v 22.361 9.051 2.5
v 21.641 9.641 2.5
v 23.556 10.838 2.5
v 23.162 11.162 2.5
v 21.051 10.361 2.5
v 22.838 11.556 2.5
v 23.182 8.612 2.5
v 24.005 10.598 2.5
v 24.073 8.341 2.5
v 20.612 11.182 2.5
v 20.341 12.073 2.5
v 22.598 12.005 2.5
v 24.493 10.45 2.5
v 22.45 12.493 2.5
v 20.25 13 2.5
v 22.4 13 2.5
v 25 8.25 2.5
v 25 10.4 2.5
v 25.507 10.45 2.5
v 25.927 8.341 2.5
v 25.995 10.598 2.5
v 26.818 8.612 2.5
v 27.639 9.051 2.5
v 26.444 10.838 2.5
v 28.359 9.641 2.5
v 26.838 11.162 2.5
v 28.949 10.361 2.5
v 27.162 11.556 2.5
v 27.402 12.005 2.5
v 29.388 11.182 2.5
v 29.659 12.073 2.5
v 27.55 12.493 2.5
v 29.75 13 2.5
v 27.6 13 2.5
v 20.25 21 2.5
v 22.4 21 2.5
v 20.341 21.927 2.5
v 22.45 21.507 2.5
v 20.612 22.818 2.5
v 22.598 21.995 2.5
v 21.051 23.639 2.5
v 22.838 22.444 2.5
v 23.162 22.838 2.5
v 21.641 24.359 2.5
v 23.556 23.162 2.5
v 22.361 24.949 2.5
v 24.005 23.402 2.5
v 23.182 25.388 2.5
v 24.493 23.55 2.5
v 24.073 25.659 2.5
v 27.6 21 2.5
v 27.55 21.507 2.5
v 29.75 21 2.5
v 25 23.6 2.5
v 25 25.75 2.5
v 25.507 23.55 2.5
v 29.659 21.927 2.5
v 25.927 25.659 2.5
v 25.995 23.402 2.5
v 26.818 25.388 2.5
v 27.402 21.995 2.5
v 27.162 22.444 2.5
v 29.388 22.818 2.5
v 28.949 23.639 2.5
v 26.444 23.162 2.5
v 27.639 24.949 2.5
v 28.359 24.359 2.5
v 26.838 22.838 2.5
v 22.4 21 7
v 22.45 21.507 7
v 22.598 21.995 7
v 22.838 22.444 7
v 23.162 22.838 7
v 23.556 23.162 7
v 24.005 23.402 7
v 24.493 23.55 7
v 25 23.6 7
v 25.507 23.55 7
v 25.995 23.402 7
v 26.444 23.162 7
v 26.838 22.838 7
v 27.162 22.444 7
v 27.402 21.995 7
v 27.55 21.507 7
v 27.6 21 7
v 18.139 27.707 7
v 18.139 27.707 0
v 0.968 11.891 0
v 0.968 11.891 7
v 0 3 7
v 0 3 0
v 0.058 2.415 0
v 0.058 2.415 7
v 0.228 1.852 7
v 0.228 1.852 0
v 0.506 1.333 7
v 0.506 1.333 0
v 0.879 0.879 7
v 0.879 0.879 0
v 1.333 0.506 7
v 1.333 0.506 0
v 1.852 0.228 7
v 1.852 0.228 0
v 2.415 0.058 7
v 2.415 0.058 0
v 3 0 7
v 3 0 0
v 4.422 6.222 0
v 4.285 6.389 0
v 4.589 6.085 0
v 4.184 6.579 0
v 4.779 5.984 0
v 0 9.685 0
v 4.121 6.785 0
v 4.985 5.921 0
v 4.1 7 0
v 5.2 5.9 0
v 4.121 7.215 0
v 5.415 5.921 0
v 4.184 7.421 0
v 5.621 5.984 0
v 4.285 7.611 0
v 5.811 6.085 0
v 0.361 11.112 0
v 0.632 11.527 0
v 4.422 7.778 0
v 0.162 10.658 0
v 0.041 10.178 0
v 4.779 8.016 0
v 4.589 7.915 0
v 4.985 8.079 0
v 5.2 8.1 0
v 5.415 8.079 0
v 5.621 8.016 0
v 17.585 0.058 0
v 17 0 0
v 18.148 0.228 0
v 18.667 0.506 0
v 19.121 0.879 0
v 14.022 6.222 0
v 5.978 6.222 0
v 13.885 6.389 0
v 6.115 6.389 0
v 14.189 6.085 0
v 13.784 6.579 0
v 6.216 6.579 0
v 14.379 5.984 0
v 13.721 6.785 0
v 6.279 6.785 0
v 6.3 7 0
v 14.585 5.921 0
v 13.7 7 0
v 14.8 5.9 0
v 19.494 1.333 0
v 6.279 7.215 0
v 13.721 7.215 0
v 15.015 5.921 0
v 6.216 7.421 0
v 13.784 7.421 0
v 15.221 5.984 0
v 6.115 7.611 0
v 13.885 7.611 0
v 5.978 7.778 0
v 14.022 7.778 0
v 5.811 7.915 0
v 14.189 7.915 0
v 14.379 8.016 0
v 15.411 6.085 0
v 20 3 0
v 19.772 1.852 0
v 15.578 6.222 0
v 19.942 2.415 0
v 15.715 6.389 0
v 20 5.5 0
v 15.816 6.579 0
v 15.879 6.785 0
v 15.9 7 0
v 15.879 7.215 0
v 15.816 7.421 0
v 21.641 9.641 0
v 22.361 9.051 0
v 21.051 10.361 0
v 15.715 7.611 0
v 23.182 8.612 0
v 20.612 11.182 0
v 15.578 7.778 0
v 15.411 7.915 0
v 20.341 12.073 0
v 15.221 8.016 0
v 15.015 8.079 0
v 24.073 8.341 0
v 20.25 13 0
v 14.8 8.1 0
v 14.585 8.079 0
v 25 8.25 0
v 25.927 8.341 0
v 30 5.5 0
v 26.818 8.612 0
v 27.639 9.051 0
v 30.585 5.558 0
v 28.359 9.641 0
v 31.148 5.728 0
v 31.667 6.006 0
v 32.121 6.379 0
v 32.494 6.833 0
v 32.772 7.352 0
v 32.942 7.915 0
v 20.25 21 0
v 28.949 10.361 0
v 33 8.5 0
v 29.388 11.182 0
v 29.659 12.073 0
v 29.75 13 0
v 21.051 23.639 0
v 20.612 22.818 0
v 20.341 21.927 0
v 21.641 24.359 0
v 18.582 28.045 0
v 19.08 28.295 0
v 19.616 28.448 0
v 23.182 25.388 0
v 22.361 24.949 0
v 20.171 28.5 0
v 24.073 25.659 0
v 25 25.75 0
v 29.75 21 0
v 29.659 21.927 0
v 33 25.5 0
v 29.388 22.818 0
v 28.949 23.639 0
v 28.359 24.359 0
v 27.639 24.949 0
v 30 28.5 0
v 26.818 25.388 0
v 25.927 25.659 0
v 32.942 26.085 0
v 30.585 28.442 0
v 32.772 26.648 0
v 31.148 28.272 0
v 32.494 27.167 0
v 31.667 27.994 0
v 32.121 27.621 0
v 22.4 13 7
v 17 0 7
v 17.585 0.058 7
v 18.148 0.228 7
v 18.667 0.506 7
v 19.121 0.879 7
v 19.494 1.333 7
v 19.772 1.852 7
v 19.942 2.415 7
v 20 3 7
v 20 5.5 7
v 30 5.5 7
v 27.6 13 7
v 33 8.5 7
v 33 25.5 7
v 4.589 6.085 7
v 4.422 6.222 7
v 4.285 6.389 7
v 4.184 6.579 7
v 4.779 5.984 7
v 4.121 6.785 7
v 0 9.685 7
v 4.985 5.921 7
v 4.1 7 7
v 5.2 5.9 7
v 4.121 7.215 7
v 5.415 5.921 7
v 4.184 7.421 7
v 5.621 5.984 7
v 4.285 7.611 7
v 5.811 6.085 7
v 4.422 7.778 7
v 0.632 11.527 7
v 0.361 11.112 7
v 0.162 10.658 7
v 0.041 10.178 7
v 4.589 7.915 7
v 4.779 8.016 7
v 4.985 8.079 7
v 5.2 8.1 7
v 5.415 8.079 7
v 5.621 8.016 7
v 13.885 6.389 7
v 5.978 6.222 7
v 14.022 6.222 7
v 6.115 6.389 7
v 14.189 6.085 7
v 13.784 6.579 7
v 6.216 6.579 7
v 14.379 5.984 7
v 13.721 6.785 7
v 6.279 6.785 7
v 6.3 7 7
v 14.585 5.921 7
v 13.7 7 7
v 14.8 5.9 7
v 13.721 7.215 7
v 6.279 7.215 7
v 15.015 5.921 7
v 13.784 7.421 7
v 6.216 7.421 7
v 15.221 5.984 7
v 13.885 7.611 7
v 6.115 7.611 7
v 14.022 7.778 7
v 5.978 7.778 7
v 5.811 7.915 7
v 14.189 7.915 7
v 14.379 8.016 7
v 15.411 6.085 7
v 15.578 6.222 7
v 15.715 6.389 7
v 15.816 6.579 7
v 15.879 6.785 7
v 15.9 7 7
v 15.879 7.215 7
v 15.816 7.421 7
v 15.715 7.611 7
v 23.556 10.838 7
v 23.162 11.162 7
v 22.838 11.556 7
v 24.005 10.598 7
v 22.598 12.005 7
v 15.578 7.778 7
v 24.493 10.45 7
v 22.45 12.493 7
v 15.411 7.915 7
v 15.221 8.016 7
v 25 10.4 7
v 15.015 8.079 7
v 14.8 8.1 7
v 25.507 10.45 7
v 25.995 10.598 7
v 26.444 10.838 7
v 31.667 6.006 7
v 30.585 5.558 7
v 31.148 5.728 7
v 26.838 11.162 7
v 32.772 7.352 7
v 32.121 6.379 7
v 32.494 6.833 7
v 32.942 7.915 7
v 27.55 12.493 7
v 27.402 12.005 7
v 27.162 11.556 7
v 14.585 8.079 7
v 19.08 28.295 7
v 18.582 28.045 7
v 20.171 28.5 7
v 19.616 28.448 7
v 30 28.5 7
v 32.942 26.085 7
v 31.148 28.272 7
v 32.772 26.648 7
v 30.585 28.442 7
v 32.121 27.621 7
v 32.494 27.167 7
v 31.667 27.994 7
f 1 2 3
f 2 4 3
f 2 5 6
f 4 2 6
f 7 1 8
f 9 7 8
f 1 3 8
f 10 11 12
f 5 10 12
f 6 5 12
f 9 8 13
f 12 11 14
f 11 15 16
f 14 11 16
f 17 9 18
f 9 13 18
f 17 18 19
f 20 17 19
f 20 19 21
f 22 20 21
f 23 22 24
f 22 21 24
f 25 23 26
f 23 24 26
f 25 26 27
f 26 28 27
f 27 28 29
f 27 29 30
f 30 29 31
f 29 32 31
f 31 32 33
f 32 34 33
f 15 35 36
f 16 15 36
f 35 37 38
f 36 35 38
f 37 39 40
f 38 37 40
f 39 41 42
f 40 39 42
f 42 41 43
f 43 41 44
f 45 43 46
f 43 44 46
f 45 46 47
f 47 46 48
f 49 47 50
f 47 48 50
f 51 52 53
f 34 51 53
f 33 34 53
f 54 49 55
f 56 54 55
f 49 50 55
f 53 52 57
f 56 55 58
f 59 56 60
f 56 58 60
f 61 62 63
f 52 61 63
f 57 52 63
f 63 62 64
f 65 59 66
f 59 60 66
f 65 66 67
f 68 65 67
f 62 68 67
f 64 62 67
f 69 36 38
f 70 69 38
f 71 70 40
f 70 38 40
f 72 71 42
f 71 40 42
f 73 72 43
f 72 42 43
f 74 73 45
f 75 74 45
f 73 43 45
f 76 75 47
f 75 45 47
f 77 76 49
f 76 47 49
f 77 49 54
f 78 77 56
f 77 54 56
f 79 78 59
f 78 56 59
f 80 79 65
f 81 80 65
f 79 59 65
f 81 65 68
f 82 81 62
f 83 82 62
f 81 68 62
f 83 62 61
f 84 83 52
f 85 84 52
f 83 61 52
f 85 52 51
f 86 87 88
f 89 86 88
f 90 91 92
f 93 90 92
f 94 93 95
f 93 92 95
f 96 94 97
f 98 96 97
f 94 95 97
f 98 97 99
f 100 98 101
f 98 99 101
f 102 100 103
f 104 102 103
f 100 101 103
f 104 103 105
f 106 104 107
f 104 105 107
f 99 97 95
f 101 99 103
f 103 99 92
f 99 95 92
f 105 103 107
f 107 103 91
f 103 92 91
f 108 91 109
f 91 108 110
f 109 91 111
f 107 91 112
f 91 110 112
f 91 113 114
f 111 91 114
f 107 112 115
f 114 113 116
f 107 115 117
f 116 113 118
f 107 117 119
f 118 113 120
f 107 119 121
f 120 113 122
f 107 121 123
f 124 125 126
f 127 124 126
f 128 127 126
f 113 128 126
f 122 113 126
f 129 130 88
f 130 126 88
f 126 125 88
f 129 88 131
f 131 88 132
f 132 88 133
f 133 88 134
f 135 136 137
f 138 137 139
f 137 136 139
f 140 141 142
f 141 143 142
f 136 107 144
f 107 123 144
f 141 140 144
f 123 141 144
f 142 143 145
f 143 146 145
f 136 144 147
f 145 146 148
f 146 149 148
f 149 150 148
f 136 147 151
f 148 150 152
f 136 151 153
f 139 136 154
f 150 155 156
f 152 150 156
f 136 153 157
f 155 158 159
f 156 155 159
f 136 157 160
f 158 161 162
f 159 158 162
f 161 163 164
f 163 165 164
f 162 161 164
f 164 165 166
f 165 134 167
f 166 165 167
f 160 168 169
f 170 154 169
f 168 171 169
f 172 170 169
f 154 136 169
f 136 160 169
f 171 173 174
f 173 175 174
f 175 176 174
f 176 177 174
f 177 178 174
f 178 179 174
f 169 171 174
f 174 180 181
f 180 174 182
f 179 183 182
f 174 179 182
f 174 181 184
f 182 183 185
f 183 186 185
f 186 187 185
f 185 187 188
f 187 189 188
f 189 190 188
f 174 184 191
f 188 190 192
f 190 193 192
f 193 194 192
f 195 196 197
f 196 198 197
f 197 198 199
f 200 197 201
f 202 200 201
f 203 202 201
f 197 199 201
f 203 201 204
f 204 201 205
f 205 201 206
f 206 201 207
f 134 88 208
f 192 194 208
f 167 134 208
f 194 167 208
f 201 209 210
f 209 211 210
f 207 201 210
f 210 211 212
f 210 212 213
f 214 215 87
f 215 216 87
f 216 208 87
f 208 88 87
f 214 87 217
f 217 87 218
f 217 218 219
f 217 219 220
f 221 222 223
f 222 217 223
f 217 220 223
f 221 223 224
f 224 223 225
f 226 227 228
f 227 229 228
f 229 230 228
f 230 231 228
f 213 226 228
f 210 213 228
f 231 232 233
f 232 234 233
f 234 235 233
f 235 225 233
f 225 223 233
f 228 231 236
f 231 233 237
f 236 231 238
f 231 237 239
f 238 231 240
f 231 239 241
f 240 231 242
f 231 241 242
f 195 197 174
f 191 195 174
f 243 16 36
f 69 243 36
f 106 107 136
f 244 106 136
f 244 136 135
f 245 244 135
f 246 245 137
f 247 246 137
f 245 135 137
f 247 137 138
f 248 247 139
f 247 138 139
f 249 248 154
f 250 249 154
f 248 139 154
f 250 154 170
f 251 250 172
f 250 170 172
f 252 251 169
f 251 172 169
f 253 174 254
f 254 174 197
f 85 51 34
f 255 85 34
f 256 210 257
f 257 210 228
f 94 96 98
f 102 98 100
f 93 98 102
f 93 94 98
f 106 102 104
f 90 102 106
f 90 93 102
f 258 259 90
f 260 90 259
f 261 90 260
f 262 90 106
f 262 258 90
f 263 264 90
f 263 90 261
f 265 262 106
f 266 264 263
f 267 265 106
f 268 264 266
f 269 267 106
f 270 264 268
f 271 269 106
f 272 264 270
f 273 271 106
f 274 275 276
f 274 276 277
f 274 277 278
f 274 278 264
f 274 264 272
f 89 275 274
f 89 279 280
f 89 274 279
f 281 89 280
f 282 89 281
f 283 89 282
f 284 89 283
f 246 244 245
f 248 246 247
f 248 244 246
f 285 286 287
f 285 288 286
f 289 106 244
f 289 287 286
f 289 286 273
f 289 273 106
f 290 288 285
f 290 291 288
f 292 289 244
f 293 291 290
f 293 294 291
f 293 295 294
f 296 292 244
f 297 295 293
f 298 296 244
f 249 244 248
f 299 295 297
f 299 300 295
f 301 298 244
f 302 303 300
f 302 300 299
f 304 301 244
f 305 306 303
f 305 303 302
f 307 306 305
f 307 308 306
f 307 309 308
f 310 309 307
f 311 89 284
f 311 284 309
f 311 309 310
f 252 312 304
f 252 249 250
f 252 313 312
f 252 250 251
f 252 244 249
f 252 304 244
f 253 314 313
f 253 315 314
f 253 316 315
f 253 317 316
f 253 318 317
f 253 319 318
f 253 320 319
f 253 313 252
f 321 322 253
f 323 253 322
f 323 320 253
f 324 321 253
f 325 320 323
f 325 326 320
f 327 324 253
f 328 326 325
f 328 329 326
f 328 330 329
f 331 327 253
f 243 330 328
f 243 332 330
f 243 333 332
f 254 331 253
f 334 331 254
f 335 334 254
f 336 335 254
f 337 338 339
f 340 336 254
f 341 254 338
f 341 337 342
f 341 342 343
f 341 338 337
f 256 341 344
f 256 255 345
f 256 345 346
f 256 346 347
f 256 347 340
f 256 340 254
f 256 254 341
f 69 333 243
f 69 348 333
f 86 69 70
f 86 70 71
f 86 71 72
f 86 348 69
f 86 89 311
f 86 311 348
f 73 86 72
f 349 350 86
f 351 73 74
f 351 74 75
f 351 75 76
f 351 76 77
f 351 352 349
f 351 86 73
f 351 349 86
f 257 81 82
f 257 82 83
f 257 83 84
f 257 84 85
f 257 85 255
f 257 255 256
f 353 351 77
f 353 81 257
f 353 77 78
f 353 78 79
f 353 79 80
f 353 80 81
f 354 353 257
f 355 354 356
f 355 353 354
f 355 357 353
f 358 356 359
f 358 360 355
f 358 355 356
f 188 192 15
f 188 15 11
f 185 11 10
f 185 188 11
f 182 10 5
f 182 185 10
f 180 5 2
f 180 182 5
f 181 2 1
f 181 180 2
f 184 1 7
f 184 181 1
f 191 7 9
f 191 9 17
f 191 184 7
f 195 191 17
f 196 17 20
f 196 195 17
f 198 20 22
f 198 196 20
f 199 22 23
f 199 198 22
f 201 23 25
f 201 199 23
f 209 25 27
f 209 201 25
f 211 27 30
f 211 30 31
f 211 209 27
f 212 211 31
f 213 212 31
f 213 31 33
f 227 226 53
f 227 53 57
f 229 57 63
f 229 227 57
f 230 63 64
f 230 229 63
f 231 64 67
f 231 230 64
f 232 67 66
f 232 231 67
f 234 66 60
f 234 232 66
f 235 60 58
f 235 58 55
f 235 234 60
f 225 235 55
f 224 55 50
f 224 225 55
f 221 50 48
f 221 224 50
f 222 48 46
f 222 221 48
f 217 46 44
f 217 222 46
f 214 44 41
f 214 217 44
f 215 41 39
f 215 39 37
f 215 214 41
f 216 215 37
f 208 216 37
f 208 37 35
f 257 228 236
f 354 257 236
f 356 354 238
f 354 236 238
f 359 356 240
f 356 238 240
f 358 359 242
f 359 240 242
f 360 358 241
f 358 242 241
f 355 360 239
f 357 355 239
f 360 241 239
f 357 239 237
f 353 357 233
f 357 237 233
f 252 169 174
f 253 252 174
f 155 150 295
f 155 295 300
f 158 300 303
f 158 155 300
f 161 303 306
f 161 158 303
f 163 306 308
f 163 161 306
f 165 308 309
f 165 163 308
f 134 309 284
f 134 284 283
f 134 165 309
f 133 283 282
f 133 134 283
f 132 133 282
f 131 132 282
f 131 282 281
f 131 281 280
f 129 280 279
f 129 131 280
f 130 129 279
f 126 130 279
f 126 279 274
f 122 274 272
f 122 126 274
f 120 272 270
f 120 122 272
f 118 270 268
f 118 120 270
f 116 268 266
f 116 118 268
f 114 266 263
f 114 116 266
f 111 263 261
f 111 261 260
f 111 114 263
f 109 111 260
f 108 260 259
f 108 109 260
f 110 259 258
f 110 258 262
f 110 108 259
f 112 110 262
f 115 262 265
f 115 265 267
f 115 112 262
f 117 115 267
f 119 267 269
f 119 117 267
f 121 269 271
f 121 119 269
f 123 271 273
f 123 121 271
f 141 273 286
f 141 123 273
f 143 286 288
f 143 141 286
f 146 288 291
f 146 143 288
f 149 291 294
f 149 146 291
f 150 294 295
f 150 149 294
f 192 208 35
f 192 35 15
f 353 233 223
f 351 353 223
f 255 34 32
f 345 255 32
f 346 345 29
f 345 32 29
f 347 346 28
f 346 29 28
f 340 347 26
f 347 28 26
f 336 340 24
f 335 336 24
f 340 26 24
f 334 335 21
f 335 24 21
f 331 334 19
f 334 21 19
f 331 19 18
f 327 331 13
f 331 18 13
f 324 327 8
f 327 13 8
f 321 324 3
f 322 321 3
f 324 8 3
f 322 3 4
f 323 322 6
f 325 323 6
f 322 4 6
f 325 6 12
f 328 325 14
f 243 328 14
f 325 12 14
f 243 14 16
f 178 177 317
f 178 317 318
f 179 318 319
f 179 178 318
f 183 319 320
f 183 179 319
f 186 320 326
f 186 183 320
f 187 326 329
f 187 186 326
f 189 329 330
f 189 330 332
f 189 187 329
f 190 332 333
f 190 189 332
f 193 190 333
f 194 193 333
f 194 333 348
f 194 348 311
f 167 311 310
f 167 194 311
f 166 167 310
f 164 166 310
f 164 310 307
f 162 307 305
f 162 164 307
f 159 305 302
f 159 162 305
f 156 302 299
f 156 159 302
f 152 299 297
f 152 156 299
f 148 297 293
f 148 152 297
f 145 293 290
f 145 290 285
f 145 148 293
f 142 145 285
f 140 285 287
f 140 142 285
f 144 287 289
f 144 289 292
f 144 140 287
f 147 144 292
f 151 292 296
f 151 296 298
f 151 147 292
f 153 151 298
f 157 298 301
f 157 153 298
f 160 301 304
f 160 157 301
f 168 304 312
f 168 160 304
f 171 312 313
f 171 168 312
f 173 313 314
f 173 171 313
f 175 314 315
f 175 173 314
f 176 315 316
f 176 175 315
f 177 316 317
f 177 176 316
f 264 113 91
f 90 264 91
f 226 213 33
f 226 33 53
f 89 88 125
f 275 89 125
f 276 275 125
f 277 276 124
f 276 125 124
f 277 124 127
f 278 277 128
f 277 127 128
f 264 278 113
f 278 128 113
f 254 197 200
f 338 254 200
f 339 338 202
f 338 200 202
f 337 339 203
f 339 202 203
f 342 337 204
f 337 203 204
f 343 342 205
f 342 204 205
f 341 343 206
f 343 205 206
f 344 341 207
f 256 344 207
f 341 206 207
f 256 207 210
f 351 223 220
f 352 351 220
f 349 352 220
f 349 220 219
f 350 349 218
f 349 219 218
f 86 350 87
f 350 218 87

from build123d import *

# Parameters (mm, degrees)
SKETCH1_R           = 1.1
BOSS_EXTRUDE1_DEPTH = 7
CUT_EXTRUDE1_DEPTH  = 2.5


with BuildPart() as part:
    # Sketch1 → Boss-Extrude1 (new body)
    with BuildSketch(Plane.XY):
        with BuildLine():
            Line((3, 0), (17, 0))
            ThreePointArc((17, 0), (19.121320344, 0.878679656), (20, 3))
            Line((20, 3), (20, 5.5))
            Line((20, 5.5), (30, 5.5))
            ThreePointArc((30, 5.5), (32.121320344, 6.378679656), (33, 8.5))
            Line((33, 8.5), (33, 25.5))
            ThreePointArc((33, 25.5), (32.121320344, 27.621320344), (30, 28.5))
            Line((30, 28.5), (20.171059892, 28.5))
            ThreePointArc((20.171059892, 28.5), (19.080167127, 28.294629309), (18.138632628, 27.706635315))
            Line((18.138632628, 27.706635315), (0.967572736, 11.891185415))
            ThreePointArc((0.967572736, 11.891185415), (0.252520993, 10.889273762), (0, 9.684550099))
            Line((0, 9.684550099), (0, 3))
            ThreePointArc((0, 3), (0.878679656, 0.878679656), (3, 0))
        make_face()
        with Locations((5.2, 7)):
            Circle(SKETCH1_R, mode=Mode.SUBTRACT)
        with Locations((14.8, 7)):
            Circle(SKETCH1_R, mode=Mode.SUBTRACT)
        with BuildLine():
            Line((27.6, 21), (27.6, 13))
            ThreePointArc((27.6, 13), (25, 10.4), (22.4, 13))
            Line((22.4, 13), (22.4, 21))
            ThreePointArc((22.4, 21), (25, 23.6), (27.6, 21))
        make_face(mode=Mode.SUBTRACT)
    extrude(amount=BOSS_EXTRUDE1_DEPTH)

    # Sketch2 → Cut-Extrude1 (cut)
    with BuildSketch(Plane(origin=(0, 0, 0), x_dir=(-1, 0, 0), z_dir=(0, 0, -1))):
        with BuildLine():
            Line((-20.25, 21), (-20.25, 13))
            ThreePointArc((-20.25, 13), (-25, 8.25), (-29.75, 13))
            Line((-29.75, 13), (-29.75, 21))
            ThreePointArc((-29.75, 21), (-25, 25.75), (-20.25, 21))
        make_face()
    extrude(amount=-CUT_EXTRUDE1_DEPTH, mode=Mode.SUBTRACT)


solid = part.part
